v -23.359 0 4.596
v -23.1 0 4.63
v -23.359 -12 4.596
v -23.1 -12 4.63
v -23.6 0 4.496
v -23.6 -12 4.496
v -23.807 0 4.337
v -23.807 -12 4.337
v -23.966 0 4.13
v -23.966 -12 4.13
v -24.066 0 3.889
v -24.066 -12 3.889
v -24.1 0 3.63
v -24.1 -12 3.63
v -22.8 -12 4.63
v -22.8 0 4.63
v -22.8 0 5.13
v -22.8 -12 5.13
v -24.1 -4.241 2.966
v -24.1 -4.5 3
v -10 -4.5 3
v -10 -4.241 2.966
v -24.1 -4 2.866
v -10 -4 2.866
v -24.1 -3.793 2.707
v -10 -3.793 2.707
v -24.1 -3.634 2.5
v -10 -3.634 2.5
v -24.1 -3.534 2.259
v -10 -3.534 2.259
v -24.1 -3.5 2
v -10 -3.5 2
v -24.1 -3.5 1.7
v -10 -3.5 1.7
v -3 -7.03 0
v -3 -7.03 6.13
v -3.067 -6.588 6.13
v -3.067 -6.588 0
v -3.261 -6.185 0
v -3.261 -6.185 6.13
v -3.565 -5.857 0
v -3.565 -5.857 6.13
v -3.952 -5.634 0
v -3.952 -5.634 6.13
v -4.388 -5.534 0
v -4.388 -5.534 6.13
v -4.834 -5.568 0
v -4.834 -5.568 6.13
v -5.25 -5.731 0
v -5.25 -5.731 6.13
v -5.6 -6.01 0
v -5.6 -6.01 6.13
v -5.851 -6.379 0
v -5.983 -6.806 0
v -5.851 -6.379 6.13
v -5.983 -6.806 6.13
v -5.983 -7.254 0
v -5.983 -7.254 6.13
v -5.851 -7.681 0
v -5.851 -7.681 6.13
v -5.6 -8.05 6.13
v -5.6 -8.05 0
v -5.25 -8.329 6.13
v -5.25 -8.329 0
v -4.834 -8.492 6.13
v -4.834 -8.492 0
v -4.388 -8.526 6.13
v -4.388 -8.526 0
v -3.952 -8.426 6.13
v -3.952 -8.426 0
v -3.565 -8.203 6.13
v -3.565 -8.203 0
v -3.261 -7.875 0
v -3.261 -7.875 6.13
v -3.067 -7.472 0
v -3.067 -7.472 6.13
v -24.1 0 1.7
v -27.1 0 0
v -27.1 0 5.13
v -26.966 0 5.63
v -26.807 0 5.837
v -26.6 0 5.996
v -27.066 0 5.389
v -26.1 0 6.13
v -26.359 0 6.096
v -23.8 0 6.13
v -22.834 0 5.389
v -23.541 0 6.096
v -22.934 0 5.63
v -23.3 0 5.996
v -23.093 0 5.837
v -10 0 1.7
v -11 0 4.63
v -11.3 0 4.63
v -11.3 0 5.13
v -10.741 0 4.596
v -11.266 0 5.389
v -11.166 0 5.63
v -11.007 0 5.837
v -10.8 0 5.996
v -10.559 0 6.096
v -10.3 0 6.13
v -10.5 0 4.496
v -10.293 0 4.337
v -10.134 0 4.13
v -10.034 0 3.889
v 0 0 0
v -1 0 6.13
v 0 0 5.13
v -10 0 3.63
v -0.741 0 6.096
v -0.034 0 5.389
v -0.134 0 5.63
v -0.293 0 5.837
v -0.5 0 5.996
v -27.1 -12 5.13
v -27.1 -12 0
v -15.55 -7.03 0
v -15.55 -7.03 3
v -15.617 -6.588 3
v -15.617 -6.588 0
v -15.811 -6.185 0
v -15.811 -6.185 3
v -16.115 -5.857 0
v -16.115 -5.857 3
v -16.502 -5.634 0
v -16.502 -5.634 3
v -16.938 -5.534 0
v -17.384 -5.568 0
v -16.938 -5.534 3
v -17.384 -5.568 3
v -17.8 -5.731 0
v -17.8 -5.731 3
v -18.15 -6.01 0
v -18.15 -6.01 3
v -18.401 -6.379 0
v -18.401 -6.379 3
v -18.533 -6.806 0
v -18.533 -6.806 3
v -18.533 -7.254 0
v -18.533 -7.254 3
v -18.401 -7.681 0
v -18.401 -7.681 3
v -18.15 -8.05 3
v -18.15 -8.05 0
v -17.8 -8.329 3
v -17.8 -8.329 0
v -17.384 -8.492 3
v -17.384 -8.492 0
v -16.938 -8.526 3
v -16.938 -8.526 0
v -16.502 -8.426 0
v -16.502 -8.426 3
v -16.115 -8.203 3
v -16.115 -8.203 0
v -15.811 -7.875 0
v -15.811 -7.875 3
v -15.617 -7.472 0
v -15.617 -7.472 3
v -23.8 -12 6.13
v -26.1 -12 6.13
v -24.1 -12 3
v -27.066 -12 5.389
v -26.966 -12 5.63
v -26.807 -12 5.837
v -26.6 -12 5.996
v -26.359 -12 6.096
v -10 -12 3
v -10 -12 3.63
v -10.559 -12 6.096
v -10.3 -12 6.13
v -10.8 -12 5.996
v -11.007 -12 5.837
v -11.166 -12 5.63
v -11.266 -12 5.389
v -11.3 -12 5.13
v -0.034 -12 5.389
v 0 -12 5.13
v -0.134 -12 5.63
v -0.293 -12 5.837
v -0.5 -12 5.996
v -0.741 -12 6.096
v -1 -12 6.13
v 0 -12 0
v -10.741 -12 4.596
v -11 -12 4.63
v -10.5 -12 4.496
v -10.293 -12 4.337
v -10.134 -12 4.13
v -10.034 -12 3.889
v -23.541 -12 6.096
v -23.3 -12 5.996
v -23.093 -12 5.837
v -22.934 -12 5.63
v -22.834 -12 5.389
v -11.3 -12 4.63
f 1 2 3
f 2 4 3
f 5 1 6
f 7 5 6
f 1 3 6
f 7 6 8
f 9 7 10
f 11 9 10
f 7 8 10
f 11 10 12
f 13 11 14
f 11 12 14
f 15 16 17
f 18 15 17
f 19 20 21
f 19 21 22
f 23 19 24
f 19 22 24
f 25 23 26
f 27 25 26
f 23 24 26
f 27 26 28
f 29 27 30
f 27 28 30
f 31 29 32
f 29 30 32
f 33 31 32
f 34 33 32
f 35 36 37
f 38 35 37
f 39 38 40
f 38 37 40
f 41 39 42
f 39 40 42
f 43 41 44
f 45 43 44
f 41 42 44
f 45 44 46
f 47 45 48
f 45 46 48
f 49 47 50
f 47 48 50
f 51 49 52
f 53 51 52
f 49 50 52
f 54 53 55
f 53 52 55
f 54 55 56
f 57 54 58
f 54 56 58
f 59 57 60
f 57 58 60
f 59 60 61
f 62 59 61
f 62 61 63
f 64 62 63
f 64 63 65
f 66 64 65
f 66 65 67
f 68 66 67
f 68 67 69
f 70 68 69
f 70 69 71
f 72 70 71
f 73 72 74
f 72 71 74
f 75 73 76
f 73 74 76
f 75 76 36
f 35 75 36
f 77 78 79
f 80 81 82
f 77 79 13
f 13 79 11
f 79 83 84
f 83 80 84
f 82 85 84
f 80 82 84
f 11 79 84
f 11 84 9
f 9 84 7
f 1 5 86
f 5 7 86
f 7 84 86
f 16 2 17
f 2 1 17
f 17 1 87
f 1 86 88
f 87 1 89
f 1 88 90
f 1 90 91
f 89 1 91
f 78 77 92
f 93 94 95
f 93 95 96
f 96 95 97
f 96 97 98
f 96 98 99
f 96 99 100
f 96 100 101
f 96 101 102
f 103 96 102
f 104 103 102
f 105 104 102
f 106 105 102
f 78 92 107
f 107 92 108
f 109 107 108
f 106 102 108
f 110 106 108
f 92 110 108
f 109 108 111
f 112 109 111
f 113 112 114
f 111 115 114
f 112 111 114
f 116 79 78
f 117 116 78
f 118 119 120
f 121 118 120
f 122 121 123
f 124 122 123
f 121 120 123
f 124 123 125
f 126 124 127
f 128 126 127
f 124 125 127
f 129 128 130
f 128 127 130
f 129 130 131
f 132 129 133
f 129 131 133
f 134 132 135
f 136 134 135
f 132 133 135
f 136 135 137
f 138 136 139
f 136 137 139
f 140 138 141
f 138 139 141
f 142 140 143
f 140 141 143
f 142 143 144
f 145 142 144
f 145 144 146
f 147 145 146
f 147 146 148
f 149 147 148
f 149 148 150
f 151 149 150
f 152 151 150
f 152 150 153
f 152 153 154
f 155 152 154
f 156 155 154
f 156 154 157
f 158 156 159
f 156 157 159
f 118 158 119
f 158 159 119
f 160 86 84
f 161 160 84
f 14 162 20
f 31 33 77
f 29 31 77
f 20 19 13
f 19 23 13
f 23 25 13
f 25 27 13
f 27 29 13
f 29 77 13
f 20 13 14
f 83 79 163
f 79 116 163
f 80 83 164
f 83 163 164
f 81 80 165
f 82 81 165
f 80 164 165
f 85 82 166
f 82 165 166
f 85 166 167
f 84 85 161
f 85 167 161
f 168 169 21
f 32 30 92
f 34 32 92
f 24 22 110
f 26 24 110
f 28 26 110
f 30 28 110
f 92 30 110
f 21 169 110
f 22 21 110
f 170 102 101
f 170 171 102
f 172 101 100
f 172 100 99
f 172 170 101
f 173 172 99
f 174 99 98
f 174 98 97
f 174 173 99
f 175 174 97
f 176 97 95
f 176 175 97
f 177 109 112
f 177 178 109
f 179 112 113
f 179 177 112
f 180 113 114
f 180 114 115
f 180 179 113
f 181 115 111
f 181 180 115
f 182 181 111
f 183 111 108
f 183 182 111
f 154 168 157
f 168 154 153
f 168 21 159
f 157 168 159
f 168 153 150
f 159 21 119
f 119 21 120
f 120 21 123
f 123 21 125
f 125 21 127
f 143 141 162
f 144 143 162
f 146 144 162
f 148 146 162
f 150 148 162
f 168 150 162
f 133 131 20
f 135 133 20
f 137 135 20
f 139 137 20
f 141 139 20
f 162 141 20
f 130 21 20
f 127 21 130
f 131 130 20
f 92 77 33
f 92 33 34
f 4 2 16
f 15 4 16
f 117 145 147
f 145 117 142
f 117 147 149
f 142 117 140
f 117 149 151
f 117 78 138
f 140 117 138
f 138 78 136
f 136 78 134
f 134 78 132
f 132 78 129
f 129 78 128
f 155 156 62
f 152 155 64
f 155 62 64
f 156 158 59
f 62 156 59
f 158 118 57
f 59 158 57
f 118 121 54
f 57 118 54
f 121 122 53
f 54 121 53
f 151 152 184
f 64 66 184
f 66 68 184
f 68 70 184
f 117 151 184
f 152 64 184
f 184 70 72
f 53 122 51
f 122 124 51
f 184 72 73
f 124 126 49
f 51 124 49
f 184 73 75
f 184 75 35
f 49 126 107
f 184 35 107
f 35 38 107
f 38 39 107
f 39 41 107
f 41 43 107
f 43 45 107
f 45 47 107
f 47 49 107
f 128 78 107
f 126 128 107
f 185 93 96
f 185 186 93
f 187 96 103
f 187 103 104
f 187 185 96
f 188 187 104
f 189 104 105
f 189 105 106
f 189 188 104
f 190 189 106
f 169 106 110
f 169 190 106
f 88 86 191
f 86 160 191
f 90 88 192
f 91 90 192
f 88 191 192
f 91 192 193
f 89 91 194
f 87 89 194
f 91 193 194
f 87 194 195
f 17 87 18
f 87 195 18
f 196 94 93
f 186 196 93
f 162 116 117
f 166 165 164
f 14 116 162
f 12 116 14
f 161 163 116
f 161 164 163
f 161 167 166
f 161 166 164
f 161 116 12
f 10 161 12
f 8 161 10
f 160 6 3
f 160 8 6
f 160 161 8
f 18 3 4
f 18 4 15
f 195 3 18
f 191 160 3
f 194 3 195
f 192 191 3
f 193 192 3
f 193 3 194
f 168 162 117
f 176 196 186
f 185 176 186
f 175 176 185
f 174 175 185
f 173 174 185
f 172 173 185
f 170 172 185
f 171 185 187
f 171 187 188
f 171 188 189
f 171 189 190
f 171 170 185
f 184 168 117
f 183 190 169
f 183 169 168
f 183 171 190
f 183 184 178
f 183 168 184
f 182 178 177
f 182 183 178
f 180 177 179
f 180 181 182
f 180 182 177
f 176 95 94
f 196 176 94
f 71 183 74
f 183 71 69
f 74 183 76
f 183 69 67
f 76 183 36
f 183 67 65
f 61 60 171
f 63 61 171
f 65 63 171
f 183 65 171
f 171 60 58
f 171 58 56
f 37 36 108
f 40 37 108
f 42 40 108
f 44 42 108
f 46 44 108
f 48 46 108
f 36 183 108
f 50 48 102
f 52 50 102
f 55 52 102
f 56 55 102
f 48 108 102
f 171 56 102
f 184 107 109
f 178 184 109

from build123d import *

# Parameters (mm, degrees)
F1_DEPTH = 12
F2_W     = 14.1
F2_H     = 3.5
F3_DEPTH = 1.3
F4_R     = 1.5
F5_DEPTH = 3
F6_R     = 1.5
F7_DEPTH = 6.13
F8_R     = 1
F9_R     = 1


with BuildPart() as f1:
    # F0 (on Front) → F1 (new body)
    with BuildSketch(Plane.XZ):
        Polygon((-27.1, 0), (0, 0), (0, 6.13), (-11.3, 6.13), (-11.3, 4.63), (-10, 4.63), (-10, 3), (-24.1, 3), (-24.1, 4.63), (-22.8, 4.63), (-22.8, 6.13), (-27.1, 6.13), align=None)
    extrude(amount=F1_DEPTH)

    # F2 (on face) → F3 (cut)
    with BuildSketch(Plane.XY.offset(3)):
        with Locations((-17.05, -1.75)):
            Rectangle(F2_W, F2_H)
    extrude(amount=-F3_DEPTH, mode=Mode.SUBTRACT)

    # F4 (on face) → F5 (cut, through all)
    with BuildSketch(Plane.XY.offset(3)):
        with Locations((-17.05, -7.03)):
            Circle(F4_R)
    extrude(amount=-F5_DEPTH, mode=Mode.SUBTRACT)

    # F6 (on face) → F7 (cut, through all)
    with BuildSketch(Plane.XY.offset(6.13)):
        with Locations((-4.5, -7.03)):
            Circle(F6_R)
    extrude(amount=-F7_DEPTH, mode=Mode.SUBTRACT)

    # F8
    f8_edges = [f1.edges().sort_by_distance(p)[0] for p in [
        (-22.8, -6, 6.13),
        (-11.3, -6, 6.13),
        (-27.1, -6, 6.13),
        (0, -6, 6.13),
        (-17.05, -3.5, 3),
    ]]
    fillet(f8_edges, radius=F8_R)

    # F9
    f9_edges = [f1.edges().sort_by_distance(p)[0] for p in [
        (-24.1, -6, 4.63),
        (-10, -6, 4.63),
    ]]
    fillet(f9_edges, radius=F9_R)


solid = f1.part
